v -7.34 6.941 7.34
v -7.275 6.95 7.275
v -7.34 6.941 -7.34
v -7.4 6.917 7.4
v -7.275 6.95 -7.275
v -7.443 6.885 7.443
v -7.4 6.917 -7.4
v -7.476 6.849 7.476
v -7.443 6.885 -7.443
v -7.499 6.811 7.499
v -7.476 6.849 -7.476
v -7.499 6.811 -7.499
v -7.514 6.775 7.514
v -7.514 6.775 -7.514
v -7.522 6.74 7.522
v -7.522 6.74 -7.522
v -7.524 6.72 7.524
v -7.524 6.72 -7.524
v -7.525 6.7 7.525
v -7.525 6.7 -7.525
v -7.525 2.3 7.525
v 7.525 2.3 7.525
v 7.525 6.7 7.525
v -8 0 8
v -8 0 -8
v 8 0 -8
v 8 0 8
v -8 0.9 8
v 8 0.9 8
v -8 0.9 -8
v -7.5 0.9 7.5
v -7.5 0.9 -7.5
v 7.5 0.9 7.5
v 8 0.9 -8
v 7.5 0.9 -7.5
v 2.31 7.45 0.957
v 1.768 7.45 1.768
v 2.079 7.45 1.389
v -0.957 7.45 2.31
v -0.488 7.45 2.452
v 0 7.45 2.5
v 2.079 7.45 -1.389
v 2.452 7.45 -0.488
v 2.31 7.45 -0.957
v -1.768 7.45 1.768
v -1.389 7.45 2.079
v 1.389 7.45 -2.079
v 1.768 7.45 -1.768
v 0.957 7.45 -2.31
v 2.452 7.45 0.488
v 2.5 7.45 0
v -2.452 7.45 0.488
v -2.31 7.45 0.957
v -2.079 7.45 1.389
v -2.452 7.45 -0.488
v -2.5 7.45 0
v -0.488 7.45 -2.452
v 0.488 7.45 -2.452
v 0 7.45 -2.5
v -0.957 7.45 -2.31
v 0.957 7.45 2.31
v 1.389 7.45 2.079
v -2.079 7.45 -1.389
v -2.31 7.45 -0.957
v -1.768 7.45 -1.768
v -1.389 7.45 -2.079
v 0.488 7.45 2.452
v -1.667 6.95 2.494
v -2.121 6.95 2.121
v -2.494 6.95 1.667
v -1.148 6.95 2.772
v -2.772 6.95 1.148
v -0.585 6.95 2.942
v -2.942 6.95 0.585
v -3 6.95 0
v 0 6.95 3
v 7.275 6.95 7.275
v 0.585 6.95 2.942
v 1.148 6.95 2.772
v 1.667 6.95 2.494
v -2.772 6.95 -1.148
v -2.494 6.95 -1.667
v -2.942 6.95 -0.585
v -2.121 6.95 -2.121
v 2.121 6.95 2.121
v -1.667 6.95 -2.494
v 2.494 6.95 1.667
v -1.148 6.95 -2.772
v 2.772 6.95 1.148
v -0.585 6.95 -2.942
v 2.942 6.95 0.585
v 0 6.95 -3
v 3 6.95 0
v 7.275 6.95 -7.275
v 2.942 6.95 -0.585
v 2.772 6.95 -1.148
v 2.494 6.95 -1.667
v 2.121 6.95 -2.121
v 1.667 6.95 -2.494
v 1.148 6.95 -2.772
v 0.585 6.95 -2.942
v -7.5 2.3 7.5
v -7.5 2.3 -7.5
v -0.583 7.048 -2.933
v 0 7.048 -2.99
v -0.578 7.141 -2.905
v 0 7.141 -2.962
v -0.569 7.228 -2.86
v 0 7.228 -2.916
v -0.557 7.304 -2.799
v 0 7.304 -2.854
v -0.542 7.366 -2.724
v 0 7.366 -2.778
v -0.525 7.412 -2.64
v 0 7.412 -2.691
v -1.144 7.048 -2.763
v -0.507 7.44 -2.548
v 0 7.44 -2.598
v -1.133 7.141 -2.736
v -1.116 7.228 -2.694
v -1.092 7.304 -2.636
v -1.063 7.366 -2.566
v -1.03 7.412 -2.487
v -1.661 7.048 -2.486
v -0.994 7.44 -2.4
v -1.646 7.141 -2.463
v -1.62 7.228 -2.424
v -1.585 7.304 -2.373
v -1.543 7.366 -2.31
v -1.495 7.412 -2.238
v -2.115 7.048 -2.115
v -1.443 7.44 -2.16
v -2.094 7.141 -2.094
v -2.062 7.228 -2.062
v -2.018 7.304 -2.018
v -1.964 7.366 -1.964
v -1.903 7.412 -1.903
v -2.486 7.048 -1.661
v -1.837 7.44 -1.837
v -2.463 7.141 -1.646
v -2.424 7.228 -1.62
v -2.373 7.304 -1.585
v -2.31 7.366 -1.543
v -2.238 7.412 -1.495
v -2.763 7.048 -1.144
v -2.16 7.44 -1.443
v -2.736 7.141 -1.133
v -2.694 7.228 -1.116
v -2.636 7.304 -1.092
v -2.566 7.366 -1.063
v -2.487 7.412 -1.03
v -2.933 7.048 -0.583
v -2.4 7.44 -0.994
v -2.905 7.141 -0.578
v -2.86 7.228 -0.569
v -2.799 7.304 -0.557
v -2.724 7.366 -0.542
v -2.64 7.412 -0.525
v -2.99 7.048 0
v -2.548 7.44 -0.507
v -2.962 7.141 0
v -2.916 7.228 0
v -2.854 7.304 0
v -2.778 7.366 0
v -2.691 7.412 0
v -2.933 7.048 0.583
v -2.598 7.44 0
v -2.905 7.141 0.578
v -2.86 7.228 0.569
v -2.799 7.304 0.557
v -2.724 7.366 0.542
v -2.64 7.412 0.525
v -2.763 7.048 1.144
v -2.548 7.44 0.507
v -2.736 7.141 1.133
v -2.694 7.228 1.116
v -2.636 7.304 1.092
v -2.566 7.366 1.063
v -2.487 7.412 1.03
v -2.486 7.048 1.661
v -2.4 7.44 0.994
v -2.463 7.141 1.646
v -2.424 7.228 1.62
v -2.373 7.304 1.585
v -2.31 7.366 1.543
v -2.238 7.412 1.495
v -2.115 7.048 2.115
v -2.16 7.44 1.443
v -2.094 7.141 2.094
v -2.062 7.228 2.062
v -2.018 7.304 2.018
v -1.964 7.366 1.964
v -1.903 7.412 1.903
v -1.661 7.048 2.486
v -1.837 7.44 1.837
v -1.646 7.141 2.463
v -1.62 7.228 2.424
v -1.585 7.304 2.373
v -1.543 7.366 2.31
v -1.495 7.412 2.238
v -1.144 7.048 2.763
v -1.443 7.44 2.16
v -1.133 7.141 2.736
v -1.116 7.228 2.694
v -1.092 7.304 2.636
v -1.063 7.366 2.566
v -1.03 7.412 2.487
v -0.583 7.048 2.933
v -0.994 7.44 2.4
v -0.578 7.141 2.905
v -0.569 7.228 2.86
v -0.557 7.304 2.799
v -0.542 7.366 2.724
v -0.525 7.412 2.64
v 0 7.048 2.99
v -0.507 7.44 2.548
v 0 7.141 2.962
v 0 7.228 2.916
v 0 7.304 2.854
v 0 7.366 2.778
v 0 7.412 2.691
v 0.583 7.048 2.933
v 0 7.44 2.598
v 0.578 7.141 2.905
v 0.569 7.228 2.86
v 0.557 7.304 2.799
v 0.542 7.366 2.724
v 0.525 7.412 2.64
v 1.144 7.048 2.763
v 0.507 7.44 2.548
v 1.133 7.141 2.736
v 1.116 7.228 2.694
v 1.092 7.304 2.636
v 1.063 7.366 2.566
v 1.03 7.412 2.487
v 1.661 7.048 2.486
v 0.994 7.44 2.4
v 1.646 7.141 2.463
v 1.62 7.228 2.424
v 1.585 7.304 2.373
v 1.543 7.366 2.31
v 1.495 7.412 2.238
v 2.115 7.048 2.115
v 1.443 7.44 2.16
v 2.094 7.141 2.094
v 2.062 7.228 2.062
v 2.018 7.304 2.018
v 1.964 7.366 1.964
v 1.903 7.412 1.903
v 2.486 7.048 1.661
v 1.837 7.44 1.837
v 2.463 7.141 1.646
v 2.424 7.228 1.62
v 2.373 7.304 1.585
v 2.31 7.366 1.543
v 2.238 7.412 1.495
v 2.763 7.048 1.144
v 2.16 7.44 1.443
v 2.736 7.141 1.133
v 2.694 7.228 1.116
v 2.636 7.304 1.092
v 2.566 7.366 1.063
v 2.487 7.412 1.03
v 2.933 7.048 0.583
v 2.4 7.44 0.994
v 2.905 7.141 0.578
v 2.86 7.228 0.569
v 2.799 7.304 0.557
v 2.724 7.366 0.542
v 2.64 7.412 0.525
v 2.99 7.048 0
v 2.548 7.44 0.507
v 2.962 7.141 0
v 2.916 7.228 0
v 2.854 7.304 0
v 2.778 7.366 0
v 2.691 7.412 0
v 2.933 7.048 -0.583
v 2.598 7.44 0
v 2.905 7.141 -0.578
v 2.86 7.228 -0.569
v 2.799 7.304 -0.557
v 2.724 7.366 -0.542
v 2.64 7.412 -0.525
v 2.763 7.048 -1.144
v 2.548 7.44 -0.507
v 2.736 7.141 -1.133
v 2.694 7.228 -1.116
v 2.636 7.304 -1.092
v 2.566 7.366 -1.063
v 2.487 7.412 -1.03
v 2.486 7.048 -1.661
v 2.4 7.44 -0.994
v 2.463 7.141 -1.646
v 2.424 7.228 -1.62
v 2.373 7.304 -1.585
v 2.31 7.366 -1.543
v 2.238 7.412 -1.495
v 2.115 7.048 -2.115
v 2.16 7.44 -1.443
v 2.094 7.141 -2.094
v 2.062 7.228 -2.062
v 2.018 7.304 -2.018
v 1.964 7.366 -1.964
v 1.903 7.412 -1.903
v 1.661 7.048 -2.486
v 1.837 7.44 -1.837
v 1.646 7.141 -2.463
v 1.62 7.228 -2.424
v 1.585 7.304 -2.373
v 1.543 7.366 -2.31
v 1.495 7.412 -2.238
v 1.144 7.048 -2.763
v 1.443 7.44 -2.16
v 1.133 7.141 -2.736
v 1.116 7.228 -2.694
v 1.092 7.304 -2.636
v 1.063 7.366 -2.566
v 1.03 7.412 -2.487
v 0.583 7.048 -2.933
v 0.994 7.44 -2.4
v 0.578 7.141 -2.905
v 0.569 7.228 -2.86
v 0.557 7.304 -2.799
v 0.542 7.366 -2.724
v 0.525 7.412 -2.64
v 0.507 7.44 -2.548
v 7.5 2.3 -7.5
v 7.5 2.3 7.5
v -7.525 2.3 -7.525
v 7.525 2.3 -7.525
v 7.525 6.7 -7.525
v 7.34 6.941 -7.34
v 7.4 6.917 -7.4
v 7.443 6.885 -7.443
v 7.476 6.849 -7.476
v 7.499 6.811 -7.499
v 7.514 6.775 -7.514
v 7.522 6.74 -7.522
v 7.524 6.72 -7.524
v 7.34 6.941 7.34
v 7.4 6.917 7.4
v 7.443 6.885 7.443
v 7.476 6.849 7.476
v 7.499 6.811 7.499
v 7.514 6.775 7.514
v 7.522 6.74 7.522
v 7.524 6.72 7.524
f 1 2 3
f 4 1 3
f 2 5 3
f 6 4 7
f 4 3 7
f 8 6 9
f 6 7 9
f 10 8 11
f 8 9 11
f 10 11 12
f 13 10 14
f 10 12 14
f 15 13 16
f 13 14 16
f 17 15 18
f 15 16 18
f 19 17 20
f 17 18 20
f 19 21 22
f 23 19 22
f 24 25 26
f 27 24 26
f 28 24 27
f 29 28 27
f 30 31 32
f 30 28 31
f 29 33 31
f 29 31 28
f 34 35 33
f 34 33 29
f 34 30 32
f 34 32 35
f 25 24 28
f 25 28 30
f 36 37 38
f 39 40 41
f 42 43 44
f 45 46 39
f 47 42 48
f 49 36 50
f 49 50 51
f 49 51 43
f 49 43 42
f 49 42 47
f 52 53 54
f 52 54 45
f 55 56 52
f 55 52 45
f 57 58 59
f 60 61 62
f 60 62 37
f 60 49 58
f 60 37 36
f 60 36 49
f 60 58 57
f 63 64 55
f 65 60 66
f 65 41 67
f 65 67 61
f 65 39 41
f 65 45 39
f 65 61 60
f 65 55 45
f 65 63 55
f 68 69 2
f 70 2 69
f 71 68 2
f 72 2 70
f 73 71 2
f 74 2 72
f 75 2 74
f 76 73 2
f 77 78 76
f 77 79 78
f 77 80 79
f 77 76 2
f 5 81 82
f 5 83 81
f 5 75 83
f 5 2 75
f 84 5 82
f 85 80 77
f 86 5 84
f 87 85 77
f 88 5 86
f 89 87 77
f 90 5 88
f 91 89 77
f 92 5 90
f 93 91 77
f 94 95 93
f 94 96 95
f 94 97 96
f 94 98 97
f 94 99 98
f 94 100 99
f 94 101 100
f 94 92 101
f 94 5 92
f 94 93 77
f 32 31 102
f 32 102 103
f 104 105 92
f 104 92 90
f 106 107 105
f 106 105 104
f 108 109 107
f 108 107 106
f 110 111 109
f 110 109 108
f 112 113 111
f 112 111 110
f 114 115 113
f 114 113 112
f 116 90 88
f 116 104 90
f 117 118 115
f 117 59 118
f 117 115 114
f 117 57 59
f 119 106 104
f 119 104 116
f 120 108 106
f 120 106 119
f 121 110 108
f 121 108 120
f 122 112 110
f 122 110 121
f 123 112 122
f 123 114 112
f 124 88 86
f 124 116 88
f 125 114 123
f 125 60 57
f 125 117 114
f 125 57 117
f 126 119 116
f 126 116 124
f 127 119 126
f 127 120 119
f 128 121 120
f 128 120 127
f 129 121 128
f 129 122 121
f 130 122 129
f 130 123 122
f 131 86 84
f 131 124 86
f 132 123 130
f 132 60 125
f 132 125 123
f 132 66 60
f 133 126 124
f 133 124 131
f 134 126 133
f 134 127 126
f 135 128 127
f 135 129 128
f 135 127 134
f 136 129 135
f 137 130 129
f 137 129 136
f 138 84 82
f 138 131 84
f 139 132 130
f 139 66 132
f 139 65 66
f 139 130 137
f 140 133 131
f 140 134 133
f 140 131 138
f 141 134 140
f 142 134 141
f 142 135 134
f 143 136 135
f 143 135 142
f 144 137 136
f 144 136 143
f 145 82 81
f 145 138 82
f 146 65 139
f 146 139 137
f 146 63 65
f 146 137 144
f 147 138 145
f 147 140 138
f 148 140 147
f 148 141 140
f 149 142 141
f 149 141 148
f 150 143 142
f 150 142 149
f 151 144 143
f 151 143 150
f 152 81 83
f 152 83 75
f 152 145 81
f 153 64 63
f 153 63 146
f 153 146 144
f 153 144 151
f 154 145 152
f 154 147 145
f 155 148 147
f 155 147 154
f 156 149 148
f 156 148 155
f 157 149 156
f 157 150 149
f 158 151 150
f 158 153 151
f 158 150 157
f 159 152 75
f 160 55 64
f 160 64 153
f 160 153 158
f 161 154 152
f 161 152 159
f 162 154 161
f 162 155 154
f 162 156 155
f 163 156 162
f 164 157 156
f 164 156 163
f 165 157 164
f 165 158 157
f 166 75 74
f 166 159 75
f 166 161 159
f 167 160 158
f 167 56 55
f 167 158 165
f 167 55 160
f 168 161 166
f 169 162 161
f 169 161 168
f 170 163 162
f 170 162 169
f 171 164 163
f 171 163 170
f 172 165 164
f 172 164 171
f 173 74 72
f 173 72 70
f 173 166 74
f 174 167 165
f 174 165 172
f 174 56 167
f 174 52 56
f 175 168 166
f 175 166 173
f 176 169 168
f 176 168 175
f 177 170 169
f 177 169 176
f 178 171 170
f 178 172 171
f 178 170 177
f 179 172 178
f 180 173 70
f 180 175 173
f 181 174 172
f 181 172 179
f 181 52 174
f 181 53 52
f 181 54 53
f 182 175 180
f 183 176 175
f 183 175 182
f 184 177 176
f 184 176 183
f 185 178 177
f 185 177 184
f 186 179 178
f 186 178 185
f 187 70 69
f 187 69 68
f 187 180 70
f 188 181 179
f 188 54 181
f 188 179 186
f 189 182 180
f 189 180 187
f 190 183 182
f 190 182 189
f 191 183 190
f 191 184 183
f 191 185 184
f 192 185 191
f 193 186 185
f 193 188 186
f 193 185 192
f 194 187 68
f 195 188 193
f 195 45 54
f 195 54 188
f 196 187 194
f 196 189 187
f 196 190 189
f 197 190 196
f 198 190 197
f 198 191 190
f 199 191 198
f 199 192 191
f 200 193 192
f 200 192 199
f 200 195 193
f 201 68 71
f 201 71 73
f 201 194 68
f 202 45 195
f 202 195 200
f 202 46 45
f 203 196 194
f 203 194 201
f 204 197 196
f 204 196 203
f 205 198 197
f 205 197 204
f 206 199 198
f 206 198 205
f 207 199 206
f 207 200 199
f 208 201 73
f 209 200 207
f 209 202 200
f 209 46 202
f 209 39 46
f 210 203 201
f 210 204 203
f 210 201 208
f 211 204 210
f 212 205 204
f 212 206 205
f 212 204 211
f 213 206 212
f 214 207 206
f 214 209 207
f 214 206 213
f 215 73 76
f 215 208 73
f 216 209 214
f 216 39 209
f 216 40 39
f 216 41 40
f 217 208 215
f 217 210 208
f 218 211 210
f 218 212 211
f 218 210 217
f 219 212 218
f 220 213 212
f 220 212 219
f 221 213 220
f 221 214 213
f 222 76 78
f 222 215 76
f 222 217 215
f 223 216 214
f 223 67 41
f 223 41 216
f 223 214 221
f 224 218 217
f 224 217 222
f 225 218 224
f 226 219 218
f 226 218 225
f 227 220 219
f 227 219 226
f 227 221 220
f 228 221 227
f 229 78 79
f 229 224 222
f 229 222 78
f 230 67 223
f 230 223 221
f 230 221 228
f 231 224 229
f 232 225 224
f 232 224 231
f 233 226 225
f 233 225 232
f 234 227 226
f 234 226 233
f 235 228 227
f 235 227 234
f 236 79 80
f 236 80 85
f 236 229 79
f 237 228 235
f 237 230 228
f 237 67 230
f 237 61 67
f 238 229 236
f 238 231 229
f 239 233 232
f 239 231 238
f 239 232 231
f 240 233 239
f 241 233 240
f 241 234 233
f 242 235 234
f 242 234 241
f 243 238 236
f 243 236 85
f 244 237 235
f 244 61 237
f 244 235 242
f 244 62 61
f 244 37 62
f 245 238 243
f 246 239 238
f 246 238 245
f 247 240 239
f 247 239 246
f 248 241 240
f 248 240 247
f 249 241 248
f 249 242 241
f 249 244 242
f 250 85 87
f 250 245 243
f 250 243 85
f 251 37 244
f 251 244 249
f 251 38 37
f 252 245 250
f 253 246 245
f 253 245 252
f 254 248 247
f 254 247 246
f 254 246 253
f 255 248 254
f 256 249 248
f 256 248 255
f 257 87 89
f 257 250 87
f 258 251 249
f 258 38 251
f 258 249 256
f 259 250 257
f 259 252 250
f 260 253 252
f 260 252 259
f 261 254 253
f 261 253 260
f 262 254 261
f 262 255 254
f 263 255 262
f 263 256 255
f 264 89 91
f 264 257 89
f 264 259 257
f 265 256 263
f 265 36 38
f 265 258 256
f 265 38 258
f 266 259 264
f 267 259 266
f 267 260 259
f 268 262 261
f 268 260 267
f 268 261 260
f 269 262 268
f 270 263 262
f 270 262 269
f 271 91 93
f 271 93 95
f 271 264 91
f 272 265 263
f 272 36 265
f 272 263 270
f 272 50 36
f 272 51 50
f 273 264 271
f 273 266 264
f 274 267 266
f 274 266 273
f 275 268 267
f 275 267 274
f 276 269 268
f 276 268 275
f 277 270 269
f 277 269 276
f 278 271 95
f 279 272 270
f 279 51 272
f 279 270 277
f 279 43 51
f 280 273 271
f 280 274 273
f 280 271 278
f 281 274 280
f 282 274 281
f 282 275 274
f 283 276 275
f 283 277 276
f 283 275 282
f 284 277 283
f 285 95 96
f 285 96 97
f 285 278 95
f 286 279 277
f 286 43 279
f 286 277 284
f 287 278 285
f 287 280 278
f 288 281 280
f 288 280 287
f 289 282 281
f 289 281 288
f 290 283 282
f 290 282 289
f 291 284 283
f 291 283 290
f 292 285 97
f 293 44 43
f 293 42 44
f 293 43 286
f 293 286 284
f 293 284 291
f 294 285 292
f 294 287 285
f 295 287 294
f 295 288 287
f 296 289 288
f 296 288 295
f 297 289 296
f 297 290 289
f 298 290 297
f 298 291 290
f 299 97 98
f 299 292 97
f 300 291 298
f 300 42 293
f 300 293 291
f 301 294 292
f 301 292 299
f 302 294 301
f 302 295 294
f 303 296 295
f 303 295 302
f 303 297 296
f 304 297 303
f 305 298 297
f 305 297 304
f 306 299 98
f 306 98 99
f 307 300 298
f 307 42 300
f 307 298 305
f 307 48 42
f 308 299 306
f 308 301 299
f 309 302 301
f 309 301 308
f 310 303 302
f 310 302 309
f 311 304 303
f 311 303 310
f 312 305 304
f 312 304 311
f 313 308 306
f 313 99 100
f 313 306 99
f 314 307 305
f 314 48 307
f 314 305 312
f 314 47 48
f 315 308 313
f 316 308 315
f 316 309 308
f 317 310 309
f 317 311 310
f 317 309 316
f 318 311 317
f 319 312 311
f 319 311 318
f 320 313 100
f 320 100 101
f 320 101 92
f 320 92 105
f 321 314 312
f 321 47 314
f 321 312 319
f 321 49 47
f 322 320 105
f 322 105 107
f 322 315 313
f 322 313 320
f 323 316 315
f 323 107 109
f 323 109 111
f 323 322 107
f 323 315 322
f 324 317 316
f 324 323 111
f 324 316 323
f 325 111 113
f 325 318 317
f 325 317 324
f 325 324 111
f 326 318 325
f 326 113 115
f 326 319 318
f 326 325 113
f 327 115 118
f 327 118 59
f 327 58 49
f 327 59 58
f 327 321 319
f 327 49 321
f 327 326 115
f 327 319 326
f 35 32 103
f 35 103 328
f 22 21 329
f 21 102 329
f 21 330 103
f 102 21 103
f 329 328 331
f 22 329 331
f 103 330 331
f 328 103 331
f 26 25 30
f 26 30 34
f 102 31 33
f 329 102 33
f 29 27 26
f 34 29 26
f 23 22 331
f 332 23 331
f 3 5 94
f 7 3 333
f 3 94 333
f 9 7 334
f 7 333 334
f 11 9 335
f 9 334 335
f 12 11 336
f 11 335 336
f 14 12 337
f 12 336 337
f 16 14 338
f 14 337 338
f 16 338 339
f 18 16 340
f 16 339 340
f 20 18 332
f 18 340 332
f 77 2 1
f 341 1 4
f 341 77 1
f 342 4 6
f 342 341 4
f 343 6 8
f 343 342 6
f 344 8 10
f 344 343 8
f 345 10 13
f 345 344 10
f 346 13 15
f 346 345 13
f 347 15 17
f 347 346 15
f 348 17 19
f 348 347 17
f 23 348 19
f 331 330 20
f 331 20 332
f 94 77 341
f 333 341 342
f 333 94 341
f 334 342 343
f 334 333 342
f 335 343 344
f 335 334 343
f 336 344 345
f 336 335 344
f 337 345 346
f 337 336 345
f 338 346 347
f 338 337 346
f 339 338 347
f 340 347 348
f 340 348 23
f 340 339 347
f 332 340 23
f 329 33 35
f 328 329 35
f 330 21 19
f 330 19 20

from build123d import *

# Parameters (mm, degrees)
ESQUISSE1_W        = 16
ESQUISSE1_H        = 16
BOSS_EXTRU_1_DEPTH = 0.9
ESQUISSE2_W        = 15
ESQUISSE2_H        = 15
BOSS_EXTRU_2_DEPTH = 2.3
ESQUISSE3_W        = 15.05
ESQUISSE3_H        = 15.05
BOSS_EXTRU_3_DEPTH = 4.65
ESQUISSE4_R        = 3
BOSS_EXTRU_4_DEPTH = 0.5
CONG_1_R           = 0.5
CONG_2_R           = 0.25


with BuildPart() as part:
    # Esquisse1 → Boss.-Extru.1 (new body)
    with BuildSketch(Plane(origin=(0, 0, 0), x_dir=(1, 0, 0), z_dir=(0, 1, 0))):
        Rectangle(ESQUISSE1_W, ESQUISSE1_H)
    extrude(amount=BOSS_EXTRU_1_DEPTH)

    # Esquisse2 → Boss.-Extru.2 (add)
    with BuildSketch(Plane(origin=(0, 0, 0), x_dir=(1, 0, 0), z_dir=(0, 1, 0))):
        Rectangle(ESQUISSE2_W, ESQUISSE2_H)
    extrude(amount=BOSS_EXTRU_2_DEPTH)

    # Esquisse3 → Boss.-Extru.3 (add)
    with BuildSketch(Plane(origin=(0, 2.3, 0), x_dir=(1, 0, 0), z_dir=(0, 1, 0))):
        Rectangle(ESQUISSE3_W, ESQUISSE3_H)
    extrude(amount=BOSS_EXTRU_3_DEPTH)

    # Esquisse4 → Boss.-Extru.4 (add)
    with BuildSketch(Plane(origin=(0, 6.95, 0), x_dir=(1, 0, 0), z_dir=(0, 1, 0))):
        with Locations(Location((0, 0, 0), (0, 0, 90))):
            Circle(ESQUISSE4_R)
    extrude(amount=BOSS_EXTRU_4_DEPTH)

    # Congé1
    cong_1_edges = [part.edges().sort_by_distance(p)[0] for p in [
        (0, 7.45, 3),
    ]]
    fillet(cong_1_edges, radius=CONG_1_R - 0.0001)  # a hair under: the kernel refuses the full size

    # Congé2
    cong_2_edges = [part.edges().sort_by_distance(p)[0] for p in [
        (7.525, 6.95, 0),
        (0, 6.95, -7.525),
        (-7.525, 6.95, 0),
        (0, 6.95, 7.525),
    ]]
    fillet(cong_2_edges, radius=CONG_2_R)


solid = part.part
